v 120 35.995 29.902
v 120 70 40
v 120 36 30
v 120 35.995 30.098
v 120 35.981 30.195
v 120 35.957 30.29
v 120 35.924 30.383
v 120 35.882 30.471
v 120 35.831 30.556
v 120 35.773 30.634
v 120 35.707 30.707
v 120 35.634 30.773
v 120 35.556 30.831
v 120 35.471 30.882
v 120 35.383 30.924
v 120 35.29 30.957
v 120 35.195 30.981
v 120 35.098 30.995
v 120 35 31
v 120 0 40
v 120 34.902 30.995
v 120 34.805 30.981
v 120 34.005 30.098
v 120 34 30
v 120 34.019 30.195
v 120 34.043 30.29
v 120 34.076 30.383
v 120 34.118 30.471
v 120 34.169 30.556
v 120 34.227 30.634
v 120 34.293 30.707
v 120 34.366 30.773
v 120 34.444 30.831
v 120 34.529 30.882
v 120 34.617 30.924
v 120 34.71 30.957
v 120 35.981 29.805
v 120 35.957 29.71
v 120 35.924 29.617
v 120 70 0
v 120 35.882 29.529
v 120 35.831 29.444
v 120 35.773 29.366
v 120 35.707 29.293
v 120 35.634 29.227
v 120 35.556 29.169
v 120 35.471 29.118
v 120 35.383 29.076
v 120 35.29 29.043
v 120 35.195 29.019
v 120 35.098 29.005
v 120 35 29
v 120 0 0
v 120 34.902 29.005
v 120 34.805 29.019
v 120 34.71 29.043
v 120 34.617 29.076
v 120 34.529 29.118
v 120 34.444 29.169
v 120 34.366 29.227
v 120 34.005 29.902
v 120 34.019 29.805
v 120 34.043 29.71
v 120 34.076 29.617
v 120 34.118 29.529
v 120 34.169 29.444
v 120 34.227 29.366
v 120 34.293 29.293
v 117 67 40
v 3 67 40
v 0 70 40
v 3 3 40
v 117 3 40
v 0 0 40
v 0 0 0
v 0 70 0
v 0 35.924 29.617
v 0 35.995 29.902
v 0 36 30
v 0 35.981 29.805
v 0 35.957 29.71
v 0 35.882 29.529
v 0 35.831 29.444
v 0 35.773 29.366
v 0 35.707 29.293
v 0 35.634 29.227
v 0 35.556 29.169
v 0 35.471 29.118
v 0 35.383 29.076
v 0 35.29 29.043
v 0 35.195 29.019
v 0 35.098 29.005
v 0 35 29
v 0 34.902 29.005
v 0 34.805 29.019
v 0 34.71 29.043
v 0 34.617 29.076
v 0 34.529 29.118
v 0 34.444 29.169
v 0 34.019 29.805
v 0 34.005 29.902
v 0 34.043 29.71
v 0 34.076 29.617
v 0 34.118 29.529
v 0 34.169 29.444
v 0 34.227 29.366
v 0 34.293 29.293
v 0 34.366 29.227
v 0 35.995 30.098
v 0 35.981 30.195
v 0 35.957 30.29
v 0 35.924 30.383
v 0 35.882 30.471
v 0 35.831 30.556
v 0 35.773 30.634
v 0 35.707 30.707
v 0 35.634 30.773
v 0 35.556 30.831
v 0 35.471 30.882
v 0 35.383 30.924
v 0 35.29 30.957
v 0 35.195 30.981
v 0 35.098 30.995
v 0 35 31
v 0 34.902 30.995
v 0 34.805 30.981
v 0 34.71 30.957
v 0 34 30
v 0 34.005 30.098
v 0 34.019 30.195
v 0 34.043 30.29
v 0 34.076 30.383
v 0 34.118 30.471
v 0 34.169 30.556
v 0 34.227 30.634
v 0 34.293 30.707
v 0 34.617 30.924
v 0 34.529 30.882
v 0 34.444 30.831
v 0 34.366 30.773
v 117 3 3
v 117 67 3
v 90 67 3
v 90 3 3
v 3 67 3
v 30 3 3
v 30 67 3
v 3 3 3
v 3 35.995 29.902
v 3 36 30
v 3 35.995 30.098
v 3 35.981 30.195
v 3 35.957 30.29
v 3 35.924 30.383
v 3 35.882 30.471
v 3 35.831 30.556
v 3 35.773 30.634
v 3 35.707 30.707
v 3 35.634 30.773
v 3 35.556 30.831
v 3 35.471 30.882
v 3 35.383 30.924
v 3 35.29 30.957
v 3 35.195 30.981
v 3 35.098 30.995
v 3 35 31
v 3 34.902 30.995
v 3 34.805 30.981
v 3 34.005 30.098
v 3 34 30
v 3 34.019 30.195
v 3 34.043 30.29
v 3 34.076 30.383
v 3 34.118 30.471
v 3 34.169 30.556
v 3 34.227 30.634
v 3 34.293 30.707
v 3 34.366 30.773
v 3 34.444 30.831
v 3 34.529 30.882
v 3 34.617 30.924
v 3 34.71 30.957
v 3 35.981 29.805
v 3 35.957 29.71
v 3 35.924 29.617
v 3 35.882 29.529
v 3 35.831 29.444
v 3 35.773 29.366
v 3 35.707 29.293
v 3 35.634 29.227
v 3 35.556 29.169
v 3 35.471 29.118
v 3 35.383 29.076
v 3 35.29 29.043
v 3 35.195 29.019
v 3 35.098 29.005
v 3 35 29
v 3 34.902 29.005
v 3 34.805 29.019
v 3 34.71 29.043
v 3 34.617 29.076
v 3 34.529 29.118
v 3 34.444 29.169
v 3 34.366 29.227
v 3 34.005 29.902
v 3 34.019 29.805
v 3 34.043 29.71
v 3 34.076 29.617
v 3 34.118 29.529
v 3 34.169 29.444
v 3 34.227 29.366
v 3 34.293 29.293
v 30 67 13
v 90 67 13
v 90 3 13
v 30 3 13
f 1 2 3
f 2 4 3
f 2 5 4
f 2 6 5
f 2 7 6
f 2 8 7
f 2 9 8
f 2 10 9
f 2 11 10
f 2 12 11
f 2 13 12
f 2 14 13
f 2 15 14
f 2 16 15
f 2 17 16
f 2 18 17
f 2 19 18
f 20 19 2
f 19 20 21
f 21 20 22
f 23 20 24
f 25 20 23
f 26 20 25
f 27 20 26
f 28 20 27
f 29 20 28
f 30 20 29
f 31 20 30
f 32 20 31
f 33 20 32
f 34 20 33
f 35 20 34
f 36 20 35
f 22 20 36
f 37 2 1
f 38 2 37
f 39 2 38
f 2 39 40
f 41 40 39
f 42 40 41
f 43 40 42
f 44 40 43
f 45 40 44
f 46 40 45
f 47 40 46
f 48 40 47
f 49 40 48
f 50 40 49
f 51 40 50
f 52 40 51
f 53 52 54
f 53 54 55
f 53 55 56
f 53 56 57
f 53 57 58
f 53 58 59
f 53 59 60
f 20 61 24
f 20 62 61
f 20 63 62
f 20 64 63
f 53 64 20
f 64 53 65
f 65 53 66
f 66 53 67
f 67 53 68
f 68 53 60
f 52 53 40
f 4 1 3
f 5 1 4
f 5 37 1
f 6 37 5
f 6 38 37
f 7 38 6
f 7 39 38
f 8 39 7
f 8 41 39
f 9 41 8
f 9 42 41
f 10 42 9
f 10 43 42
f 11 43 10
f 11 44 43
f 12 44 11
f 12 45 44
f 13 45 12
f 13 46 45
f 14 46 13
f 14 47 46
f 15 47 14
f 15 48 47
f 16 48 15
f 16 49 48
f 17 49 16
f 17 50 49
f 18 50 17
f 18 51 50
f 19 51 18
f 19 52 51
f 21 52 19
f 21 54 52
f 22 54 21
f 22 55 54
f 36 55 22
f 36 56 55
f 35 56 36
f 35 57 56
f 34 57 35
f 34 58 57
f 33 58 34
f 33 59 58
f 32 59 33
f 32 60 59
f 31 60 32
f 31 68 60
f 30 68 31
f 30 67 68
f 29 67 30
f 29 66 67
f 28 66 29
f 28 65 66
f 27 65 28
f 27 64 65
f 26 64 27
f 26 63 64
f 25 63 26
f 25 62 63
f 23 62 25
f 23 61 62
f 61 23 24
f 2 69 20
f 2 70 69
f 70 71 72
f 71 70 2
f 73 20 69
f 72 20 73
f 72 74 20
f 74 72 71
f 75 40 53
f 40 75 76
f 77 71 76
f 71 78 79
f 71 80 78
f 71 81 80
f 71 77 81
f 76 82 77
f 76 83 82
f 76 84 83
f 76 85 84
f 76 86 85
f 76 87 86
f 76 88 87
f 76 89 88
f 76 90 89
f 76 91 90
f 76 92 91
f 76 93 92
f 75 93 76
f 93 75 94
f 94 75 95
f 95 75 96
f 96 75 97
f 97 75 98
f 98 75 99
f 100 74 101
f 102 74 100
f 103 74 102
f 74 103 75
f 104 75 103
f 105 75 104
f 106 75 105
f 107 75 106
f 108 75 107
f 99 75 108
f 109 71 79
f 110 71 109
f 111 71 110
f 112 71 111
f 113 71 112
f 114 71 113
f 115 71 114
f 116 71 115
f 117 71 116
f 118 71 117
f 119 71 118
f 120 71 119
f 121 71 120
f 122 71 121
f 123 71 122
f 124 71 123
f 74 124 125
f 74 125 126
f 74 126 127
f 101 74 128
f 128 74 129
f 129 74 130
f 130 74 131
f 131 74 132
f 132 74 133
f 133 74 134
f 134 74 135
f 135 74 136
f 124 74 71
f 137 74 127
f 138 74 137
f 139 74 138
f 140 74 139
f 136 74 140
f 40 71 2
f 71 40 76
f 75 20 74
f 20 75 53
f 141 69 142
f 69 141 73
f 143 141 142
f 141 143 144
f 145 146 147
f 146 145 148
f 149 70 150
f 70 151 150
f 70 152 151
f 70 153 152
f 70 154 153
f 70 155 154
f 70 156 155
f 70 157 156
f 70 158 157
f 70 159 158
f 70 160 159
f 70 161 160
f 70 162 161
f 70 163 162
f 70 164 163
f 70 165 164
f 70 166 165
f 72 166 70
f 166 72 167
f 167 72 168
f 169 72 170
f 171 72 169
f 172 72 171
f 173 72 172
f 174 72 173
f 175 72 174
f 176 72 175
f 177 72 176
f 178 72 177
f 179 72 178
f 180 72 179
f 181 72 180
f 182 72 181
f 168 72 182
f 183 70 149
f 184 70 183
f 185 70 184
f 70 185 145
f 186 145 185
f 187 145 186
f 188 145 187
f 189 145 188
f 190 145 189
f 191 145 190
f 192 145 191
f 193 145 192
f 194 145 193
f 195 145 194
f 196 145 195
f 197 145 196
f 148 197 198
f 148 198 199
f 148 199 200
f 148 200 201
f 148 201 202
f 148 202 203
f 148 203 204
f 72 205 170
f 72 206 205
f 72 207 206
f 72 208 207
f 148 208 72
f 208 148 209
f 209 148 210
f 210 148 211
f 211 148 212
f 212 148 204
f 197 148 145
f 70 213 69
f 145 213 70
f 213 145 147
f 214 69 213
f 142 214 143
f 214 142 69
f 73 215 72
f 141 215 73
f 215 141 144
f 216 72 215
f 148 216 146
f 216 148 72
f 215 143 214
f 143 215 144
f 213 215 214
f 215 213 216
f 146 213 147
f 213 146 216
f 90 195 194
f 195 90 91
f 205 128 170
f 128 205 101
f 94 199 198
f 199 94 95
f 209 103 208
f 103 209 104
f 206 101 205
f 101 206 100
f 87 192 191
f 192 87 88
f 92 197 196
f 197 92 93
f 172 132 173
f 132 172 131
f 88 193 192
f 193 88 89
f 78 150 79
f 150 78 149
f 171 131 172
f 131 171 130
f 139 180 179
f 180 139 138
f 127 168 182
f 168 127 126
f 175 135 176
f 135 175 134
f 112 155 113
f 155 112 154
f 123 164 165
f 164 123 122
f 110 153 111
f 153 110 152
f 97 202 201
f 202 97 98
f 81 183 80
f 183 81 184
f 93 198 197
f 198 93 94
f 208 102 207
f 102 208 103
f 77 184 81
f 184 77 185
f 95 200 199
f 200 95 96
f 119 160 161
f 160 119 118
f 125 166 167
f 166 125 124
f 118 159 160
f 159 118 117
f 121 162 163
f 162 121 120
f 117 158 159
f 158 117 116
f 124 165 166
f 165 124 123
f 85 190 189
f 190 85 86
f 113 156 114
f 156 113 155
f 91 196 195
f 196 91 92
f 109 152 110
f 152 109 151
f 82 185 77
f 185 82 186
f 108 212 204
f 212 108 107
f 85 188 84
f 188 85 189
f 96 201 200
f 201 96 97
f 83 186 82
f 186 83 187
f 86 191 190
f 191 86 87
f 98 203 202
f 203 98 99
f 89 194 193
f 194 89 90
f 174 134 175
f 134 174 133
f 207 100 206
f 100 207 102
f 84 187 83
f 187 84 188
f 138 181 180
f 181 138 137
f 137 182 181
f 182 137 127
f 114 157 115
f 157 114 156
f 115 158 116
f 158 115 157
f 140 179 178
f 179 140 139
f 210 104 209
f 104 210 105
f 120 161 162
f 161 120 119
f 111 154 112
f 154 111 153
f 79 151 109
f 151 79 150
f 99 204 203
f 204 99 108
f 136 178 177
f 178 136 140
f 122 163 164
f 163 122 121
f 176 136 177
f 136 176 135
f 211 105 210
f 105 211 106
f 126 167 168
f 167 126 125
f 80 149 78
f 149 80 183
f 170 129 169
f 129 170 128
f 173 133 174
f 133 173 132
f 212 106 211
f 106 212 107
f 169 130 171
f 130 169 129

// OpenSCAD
// Buffer tank for mini horizontal gel-electrophoresis box
// Corrected to ensure the platform is a solid feature within the tank.

// --- Dimensions ---
outer_x = 120;      // Total length (X)
outer_y = 70;       // Total width (Y)
outer_z = 40;       // Total height (Z)
wall_t  = 3;        // Wall thickness
floor_t = 3;        // Floor thickness

platform_len = 60;  // Length of the central platform (X)
platform_h_rel = 10; // Height of platform top above inner floor

hole_d = 2;         // Diameter of electrode wire holes
hole_y_offset = 0;  // Y-coordinate for holes (relative to center)
hole_z = 30;        // Z-coordinate for holes

$fn = 64;

// --- Calculations ---
inner_x_start = wall_t;
inner_x_end   = outer_x - wall_t;
inner_y_start = wall_t;
inner_y_end   = outer_y - wall_t;
inner_z_start = floor_t;

platform_x_start = (outer_x / 2) - (platform_len / 2);
platform_x_end   = (outer_x / 2) + (platform_len / 2);
platform_z_top   = floor_t + platform_h_rel;

module tank_shell() {
    difference() {
        // Main outer block
        cube([outer_x, outer_y, outer_z]);
        
        // Hollow out the interior
        translate([wall_t, wall_t, floor_t])
            cube([outer_x - 2*wall_t, outer_y - 2*wall_t, outer_z]);
    }
}

module platform() {
    // The platform is a solid block placed inside the tank
    translate([platform_x_start, wall_t, floor_t])
        cube([platform_len, outer_y - 2*wall_t, platform_h_rel]);
}

module electrode_holes() {
    // Holes through the X-end walls
    // Center of Y is outer_y / 2
    // Hole 1 (Left wall)
    translate([-1, outer_y/2, hole_z])
        rotate([0, 90, 0])
            cylinder(h = wall_t + 2, d = hole_d);
            
    // Hole 2 (Right wall)
    translate([outer_x, outer_y/2, hole_z])
        rotate([0, 90, 0])
            cylinder(h = wall_t + 2, d = hole_d);
}

// --- Final Assembly ---
// We use union to combine the shell and the platform, 
// then subtract the holes from the combined solid.
difference() {
    union() {
        tank_shell();
        platform();
    }
    electrode_holes();
}
